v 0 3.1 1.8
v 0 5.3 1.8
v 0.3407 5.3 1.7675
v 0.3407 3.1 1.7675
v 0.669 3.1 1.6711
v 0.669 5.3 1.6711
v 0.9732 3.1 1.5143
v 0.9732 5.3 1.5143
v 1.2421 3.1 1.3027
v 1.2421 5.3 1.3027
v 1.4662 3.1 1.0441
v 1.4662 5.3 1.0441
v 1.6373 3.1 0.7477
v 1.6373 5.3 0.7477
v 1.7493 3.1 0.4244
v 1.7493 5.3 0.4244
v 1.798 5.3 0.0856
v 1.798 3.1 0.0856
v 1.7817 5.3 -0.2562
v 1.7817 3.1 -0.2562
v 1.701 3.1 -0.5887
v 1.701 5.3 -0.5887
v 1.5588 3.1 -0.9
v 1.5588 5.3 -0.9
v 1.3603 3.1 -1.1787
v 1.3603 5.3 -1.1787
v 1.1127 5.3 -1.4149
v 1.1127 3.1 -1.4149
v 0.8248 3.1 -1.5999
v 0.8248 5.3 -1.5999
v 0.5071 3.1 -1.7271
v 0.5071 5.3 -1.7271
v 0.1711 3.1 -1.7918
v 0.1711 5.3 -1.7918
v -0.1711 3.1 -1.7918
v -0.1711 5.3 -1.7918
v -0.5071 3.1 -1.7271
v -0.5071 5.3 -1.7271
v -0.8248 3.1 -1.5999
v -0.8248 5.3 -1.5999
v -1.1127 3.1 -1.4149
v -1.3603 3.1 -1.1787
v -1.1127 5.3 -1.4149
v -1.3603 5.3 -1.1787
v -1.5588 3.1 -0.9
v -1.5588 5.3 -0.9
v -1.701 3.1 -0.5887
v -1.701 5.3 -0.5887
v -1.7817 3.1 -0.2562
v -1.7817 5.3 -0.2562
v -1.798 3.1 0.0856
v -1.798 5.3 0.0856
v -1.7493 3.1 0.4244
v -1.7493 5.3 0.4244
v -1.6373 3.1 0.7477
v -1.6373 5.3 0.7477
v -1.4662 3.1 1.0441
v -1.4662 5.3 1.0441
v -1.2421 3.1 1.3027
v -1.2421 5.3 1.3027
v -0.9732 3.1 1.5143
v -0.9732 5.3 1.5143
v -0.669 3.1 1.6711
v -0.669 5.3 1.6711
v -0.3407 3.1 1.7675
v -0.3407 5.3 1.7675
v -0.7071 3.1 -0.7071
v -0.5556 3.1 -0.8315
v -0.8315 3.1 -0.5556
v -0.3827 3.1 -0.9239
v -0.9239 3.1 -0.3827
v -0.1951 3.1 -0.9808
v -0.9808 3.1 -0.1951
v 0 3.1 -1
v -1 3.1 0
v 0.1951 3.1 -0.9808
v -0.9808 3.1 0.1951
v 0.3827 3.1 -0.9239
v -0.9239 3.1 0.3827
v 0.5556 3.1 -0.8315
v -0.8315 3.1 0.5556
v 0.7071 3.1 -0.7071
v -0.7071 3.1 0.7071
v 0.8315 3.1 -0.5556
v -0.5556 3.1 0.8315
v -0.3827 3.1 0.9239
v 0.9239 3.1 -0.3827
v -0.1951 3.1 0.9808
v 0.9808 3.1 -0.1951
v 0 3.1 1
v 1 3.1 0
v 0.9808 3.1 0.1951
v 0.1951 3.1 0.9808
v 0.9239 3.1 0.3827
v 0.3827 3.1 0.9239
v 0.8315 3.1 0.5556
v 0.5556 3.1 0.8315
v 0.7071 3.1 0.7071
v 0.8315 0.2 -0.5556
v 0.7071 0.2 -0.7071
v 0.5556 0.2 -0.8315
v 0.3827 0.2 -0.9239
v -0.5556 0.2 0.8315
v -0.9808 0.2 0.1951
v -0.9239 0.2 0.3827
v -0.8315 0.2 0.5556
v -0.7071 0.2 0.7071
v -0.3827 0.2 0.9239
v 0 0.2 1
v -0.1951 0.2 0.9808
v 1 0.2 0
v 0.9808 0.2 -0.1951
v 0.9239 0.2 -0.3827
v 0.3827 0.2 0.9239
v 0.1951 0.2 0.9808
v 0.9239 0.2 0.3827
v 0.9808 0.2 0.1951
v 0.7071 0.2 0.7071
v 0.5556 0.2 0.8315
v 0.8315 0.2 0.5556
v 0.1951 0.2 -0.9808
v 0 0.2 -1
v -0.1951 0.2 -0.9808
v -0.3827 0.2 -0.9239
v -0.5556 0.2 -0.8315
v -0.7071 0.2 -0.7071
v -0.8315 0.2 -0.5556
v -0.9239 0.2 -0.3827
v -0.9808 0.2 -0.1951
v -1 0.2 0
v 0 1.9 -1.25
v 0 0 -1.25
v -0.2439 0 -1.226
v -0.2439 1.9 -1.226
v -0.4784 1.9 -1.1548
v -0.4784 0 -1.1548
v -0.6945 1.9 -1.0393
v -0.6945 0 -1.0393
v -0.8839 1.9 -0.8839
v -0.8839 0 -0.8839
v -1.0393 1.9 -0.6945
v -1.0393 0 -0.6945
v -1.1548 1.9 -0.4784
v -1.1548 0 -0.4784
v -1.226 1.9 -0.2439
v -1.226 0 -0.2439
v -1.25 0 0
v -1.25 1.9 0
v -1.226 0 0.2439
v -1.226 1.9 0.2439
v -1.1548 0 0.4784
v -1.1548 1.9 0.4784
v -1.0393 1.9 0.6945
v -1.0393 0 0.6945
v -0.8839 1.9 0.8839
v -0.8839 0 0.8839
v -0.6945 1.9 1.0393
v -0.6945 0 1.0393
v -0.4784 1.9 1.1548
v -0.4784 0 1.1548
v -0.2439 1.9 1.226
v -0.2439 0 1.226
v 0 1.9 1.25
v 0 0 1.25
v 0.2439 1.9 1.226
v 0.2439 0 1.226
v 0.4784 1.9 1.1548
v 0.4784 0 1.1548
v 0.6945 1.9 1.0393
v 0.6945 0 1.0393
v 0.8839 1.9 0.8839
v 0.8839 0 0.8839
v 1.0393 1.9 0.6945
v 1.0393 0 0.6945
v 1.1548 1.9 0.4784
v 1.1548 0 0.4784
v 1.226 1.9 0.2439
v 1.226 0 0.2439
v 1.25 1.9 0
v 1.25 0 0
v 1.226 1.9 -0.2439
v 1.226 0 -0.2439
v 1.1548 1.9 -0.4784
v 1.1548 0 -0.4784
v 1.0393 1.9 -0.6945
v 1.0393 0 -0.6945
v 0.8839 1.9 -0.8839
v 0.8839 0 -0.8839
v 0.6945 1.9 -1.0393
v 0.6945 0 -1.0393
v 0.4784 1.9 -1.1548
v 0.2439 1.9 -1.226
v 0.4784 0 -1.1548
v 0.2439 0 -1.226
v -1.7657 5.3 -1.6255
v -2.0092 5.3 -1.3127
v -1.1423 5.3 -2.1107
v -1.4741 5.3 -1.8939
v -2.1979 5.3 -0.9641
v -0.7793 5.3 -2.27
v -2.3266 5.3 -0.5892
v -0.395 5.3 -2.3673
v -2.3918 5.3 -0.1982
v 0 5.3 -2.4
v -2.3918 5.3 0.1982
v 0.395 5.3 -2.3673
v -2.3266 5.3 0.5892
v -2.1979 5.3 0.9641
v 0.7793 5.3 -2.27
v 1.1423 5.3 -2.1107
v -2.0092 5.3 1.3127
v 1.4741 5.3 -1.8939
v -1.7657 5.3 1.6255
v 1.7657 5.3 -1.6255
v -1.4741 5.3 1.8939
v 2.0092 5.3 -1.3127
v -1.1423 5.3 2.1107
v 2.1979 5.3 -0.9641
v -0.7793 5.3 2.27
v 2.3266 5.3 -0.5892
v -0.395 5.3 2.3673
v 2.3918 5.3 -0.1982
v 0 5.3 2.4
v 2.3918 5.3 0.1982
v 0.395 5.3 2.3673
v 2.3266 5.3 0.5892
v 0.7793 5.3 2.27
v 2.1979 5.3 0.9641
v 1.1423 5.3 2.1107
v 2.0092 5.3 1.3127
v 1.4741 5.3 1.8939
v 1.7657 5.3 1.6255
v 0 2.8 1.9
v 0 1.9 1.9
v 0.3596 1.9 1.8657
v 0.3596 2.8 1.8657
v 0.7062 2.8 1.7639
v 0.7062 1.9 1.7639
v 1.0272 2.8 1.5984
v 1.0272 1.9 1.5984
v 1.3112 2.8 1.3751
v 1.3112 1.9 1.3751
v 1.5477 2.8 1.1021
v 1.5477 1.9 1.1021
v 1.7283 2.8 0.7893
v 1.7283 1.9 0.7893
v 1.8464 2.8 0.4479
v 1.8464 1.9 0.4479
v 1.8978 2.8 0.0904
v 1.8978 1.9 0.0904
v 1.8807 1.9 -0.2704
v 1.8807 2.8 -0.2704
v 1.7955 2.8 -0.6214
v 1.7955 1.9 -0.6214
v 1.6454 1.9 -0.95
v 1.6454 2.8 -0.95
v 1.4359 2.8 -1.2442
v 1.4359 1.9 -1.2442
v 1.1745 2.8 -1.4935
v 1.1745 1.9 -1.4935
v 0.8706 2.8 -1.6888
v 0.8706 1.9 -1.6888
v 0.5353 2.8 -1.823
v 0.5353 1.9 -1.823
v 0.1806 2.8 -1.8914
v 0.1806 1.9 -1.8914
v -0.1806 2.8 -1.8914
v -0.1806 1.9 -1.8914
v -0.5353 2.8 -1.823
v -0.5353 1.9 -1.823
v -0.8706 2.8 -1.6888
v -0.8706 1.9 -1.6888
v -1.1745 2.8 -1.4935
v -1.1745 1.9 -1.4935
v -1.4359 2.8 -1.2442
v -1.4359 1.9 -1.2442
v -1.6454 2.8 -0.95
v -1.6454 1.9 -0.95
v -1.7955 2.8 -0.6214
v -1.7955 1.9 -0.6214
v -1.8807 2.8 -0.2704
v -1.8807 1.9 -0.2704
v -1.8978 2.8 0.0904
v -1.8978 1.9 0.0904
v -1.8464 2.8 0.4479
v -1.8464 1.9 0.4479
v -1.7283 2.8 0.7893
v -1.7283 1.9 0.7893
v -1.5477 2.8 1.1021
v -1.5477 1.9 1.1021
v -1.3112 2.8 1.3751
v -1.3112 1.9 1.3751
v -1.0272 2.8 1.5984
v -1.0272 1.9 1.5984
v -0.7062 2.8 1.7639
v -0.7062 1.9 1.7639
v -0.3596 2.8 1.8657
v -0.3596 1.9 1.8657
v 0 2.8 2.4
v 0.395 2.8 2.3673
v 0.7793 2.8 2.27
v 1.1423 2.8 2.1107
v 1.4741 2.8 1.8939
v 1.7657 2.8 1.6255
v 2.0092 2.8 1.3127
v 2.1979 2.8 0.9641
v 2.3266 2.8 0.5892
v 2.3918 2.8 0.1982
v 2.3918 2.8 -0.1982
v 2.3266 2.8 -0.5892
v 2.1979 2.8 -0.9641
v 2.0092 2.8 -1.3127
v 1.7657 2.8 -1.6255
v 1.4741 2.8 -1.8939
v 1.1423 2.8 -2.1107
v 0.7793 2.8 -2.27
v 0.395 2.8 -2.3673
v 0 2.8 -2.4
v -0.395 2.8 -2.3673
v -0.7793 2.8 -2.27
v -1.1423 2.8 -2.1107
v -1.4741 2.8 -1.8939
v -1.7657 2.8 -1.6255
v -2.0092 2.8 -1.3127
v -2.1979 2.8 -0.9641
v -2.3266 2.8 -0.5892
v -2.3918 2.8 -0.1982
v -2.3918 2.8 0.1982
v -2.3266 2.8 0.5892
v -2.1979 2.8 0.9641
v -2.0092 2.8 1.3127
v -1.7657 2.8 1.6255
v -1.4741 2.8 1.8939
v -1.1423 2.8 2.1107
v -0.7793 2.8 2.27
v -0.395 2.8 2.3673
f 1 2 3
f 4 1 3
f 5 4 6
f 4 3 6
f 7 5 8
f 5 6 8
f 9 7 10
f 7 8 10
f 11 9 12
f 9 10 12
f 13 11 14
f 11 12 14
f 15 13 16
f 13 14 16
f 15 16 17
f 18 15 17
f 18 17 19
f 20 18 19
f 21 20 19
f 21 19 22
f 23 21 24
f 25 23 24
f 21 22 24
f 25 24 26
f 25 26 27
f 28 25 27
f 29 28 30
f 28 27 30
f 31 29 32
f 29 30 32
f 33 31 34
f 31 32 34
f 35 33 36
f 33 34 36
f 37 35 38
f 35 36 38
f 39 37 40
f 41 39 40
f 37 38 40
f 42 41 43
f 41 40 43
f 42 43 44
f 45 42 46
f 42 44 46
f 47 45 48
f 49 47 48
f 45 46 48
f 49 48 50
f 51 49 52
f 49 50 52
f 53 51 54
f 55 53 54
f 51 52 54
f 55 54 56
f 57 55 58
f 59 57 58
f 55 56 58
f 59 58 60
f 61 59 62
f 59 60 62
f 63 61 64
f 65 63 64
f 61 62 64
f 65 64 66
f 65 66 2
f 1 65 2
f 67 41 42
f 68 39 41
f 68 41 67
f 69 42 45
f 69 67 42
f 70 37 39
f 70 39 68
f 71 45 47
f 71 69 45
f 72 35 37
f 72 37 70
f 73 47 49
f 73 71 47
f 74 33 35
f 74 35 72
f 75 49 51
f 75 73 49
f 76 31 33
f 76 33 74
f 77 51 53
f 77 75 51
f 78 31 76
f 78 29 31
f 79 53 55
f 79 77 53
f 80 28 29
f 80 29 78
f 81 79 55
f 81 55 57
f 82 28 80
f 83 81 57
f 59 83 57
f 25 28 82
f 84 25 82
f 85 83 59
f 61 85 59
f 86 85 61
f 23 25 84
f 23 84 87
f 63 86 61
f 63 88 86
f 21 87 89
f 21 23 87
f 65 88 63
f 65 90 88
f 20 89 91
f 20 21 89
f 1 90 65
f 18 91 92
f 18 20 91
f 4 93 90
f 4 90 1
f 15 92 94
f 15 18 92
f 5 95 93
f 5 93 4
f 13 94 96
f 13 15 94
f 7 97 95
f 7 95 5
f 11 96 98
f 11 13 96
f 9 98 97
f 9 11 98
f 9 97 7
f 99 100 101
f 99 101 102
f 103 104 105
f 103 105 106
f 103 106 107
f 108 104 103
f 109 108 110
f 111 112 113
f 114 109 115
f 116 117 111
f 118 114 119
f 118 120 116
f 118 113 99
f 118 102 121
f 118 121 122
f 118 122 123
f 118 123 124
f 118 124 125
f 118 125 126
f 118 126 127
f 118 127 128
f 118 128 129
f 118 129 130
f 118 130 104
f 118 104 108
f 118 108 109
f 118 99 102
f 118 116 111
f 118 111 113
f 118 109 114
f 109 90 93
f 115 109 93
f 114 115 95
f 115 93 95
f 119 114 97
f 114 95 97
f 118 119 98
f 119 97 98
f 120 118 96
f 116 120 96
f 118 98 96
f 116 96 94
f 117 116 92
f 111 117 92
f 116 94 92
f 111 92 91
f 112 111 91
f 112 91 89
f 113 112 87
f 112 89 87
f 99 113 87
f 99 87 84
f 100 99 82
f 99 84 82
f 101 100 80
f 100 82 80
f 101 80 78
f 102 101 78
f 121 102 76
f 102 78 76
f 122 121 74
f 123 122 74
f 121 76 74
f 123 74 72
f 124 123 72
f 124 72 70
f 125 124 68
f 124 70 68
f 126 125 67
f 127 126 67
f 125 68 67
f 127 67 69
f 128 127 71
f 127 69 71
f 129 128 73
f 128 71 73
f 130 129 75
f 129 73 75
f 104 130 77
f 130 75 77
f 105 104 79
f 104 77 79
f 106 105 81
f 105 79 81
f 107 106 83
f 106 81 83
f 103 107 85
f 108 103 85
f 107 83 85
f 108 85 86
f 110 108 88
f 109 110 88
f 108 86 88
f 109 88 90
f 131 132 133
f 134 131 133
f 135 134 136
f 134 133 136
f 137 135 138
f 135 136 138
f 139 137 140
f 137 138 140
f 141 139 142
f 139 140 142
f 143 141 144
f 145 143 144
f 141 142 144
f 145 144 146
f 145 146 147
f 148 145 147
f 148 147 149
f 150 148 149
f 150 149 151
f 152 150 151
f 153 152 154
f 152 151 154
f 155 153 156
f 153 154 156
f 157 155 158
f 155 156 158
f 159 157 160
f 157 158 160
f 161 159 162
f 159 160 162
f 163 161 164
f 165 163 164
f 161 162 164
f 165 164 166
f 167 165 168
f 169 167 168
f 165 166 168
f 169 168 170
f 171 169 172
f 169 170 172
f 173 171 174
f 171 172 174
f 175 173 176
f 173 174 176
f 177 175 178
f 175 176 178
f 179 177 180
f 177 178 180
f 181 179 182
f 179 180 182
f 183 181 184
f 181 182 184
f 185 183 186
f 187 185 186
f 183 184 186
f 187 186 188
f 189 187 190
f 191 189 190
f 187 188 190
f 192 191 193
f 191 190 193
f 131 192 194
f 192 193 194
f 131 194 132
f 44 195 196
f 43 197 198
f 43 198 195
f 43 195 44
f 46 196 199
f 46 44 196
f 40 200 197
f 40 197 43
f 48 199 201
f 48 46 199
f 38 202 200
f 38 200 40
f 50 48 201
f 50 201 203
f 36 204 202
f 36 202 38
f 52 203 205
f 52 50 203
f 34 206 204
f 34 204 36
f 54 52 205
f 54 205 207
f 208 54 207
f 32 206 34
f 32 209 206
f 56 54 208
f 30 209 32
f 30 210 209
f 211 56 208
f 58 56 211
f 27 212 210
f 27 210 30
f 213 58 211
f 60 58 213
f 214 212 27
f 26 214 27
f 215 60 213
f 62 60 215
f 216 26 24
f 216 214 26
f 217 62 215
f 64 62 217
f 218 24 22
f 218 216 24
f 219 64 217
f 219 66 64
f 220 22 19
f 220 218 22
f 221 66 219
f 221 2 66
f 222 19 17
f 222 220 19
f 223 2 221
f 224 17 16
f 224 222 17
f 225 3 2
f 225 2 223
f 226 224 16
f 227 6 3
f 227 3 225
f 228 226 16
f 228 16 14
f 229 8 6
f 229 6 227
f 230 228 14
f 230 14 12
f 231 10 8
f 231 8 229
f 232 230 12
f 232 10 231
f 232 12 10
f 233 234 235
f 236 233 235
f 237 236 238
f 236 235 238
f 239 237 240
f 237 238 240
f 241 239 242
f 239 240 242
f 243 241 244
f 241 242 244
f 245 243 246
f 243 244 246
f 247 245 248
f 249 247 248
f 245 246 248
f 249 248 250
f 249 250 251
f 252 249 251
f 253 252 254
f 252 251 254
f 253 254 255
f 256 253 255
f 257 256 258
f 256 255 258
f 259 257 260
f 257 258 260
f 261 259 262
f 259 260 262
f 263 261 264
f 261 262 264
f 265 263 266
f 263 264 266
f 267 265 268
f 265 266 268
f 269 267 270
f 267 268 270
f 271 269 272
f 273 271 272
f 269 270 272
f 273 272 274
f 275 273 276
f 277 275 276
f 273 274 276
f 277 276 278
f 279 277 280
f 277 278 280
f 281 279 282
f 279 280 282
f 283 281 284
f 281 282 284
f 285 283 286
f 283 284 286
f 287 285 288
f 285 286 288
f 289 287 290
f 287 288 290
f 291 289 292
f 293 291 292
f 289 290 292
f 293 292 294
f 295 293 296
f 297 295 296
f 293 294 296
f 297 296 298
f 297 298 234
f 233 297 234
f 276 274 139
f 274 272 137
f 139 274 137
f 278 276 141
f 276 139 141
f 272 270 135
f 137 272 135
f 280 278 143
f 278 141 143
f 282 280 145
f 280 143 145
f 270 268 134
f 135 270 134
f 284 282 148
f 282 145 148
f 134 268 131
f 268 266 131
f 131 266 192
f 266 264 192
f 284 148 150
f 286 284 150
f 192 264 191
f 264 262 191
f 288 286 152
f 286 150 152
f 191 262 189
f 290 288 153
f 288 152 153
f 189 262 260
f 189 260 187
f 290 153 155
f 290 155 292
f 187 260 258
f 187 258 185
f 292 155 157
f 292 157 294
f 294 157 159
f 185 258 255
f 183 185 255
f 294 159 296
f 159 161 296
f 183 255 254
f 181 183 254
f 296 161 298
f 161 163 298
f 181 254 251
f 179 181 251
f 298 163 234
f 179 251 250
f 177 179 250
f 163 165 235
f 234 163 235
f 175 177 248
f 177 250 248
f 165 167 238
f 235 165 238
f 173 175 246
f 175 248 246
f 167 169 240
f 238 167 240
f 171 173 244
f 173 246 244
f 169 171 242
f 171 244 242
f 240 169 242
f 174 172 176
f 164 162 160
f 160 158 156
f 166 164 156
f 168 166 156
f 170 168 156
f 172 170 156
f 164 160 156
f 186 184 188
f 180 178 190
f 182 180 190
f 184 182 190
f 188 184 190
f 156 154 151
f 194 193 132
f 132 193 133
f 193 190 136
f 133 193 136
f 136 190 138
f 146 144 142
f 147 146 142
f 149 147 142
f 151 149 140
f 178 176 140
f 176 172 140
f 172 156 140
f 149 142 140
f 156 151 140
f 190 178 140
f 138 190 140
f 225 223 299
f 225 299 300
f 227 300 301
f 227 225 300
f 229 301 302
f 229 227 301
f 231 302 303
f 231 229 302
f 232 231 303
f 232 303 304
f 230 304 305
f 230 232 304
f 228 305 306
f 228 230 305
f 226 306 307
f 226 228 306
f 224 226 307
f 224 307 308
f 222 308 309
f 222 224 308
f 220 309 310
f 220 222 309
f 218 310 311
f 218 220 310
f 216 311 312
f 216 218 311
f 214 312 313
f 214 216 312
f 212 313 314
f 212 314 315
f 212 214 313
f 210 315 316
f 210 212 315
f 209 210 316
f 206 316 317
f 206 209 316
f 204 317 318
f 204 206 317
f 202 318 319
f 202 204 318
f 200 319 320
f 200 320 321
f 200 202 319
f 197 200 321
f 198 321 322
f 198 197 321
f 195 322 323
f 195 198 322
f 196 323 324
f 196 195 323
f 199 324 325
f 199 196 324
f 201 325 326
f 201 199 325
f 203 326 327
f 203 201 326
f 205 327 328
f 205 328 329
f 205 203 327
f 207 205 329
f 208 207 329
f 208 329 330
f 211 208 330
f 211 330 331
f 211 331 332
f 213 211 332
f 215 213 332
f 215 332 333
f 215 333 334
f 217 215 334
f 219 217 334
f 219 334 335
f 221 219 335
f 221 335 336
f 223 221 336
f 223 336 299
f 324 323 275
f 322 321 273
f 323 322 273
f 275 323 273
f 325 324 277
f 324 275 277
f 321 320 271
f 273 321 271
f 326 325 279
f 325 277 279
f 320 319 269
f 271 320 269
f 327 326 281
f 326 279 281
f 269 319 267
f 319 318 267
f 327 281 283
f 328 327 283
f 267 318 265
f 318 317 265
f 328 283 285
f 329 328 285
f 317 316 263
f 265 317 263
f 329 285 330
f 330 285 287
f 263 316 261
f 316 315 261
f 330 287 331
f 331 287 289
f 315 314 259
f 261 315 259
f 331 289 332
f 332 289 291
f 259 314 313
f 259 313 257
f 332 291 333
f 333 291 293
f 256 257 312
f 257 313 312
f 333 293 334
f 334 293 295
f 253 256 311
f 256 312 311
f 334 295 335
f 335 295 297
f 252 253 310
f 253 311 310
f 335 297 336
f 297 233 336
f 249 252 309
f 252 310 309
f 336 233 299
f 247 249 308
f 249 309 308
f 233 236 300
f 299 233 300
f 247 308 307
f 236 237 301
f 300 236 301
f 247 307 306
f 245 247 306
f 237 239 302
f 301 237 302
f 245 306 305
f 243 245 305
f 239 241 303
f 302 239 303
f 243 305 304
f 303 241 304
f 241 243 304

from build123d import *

# Parameters (mm, degrees)
SKETCH1_R           = 1.25
BOSS_EXTRUDE1_DEPTH = 1.9
SKETCH2_R           = 1.9
BOSS_EXTRUDE2_DEPTH = 0.9
SKETCH4_R           = 2.4
BOSS_EXTRUDE4_DEPTH = 2.5
SKETCH6_R           = 1.8
CUT_EXTRUDE2_DEPTH  = 2.2
SKETCH5_R           = 1
CUT_EXTRUDE1_DEPTH  = 2.9


with BuildPart() as part:
    # Sketch1 → Boss-Extrude1 (new body)
    with BuildSketch(Plane(origin=(0, 0, 0), x_dir=(1, 0, 0), z_dir=(0, 1, 0))):
        with Locations(Location((0, 0, 0), (0, 0, 90))):
            Circle(SKETCH1_R)
    extrude(amount=BOSS_EXTRUDE1_DEPTH)

    # Sketch2 → Boss-Extrude2 (add)
    with BuildSketch(Plane(origin=(0, 1.9, 0), x_dir=(1, 0, 0), z_dir=(0, 1, 0))):
        with Locations(Location((0, 0, 0), (0, 0, 270))):
            Circle(SKETCH2_R)
    extrude(amount=BOSS_EXTRUDE2_DEPTH)

    # Sketch4 → Boss-Extrude4 (add)
    with BuildSketch(Plane(origin=(0, 5.3, 0), x_dir=(1, 0, 0), z_dir=(0, 1, 0))):
        with Locations(Location((0, 0, 0), (0, 0, 270))):
            Circle(SKETCH4_R)
    extrude(amount=-BOSS_EXTRUDE4_DEPTH)

    # Sketch6 → Cut-Extrude2 (cut)
    with BuildSketch(Plane(origin=(0, 5.3, 0), x_dir=(1, 0, 0), z_dir=(0, 1, 0))):
        with Locations(Location((0, 0, 0), (0, 0, 270))):
            Circle(SKETCH6_R)
    extrude(amount=-CUT_EXTRUDE2_DEPTH, mode=Mode.SUBTRACT)

    # Sketch5 → Cut-Extrude1 (cut)
    with BuildSketch(Plane(origin=(0, 3.1, 0), x_dir=(1, 0, 0), z_dir=(0, 1, 0))):
        with Locations(Location((0, 0, 0), (0, 0, 270))):
            Circle(SKETCH5_R)
    extrude(amount=-CUT_EXTRUDE1_DEPTH, mode=Mode.SUBTRACT)


solid = part.part
